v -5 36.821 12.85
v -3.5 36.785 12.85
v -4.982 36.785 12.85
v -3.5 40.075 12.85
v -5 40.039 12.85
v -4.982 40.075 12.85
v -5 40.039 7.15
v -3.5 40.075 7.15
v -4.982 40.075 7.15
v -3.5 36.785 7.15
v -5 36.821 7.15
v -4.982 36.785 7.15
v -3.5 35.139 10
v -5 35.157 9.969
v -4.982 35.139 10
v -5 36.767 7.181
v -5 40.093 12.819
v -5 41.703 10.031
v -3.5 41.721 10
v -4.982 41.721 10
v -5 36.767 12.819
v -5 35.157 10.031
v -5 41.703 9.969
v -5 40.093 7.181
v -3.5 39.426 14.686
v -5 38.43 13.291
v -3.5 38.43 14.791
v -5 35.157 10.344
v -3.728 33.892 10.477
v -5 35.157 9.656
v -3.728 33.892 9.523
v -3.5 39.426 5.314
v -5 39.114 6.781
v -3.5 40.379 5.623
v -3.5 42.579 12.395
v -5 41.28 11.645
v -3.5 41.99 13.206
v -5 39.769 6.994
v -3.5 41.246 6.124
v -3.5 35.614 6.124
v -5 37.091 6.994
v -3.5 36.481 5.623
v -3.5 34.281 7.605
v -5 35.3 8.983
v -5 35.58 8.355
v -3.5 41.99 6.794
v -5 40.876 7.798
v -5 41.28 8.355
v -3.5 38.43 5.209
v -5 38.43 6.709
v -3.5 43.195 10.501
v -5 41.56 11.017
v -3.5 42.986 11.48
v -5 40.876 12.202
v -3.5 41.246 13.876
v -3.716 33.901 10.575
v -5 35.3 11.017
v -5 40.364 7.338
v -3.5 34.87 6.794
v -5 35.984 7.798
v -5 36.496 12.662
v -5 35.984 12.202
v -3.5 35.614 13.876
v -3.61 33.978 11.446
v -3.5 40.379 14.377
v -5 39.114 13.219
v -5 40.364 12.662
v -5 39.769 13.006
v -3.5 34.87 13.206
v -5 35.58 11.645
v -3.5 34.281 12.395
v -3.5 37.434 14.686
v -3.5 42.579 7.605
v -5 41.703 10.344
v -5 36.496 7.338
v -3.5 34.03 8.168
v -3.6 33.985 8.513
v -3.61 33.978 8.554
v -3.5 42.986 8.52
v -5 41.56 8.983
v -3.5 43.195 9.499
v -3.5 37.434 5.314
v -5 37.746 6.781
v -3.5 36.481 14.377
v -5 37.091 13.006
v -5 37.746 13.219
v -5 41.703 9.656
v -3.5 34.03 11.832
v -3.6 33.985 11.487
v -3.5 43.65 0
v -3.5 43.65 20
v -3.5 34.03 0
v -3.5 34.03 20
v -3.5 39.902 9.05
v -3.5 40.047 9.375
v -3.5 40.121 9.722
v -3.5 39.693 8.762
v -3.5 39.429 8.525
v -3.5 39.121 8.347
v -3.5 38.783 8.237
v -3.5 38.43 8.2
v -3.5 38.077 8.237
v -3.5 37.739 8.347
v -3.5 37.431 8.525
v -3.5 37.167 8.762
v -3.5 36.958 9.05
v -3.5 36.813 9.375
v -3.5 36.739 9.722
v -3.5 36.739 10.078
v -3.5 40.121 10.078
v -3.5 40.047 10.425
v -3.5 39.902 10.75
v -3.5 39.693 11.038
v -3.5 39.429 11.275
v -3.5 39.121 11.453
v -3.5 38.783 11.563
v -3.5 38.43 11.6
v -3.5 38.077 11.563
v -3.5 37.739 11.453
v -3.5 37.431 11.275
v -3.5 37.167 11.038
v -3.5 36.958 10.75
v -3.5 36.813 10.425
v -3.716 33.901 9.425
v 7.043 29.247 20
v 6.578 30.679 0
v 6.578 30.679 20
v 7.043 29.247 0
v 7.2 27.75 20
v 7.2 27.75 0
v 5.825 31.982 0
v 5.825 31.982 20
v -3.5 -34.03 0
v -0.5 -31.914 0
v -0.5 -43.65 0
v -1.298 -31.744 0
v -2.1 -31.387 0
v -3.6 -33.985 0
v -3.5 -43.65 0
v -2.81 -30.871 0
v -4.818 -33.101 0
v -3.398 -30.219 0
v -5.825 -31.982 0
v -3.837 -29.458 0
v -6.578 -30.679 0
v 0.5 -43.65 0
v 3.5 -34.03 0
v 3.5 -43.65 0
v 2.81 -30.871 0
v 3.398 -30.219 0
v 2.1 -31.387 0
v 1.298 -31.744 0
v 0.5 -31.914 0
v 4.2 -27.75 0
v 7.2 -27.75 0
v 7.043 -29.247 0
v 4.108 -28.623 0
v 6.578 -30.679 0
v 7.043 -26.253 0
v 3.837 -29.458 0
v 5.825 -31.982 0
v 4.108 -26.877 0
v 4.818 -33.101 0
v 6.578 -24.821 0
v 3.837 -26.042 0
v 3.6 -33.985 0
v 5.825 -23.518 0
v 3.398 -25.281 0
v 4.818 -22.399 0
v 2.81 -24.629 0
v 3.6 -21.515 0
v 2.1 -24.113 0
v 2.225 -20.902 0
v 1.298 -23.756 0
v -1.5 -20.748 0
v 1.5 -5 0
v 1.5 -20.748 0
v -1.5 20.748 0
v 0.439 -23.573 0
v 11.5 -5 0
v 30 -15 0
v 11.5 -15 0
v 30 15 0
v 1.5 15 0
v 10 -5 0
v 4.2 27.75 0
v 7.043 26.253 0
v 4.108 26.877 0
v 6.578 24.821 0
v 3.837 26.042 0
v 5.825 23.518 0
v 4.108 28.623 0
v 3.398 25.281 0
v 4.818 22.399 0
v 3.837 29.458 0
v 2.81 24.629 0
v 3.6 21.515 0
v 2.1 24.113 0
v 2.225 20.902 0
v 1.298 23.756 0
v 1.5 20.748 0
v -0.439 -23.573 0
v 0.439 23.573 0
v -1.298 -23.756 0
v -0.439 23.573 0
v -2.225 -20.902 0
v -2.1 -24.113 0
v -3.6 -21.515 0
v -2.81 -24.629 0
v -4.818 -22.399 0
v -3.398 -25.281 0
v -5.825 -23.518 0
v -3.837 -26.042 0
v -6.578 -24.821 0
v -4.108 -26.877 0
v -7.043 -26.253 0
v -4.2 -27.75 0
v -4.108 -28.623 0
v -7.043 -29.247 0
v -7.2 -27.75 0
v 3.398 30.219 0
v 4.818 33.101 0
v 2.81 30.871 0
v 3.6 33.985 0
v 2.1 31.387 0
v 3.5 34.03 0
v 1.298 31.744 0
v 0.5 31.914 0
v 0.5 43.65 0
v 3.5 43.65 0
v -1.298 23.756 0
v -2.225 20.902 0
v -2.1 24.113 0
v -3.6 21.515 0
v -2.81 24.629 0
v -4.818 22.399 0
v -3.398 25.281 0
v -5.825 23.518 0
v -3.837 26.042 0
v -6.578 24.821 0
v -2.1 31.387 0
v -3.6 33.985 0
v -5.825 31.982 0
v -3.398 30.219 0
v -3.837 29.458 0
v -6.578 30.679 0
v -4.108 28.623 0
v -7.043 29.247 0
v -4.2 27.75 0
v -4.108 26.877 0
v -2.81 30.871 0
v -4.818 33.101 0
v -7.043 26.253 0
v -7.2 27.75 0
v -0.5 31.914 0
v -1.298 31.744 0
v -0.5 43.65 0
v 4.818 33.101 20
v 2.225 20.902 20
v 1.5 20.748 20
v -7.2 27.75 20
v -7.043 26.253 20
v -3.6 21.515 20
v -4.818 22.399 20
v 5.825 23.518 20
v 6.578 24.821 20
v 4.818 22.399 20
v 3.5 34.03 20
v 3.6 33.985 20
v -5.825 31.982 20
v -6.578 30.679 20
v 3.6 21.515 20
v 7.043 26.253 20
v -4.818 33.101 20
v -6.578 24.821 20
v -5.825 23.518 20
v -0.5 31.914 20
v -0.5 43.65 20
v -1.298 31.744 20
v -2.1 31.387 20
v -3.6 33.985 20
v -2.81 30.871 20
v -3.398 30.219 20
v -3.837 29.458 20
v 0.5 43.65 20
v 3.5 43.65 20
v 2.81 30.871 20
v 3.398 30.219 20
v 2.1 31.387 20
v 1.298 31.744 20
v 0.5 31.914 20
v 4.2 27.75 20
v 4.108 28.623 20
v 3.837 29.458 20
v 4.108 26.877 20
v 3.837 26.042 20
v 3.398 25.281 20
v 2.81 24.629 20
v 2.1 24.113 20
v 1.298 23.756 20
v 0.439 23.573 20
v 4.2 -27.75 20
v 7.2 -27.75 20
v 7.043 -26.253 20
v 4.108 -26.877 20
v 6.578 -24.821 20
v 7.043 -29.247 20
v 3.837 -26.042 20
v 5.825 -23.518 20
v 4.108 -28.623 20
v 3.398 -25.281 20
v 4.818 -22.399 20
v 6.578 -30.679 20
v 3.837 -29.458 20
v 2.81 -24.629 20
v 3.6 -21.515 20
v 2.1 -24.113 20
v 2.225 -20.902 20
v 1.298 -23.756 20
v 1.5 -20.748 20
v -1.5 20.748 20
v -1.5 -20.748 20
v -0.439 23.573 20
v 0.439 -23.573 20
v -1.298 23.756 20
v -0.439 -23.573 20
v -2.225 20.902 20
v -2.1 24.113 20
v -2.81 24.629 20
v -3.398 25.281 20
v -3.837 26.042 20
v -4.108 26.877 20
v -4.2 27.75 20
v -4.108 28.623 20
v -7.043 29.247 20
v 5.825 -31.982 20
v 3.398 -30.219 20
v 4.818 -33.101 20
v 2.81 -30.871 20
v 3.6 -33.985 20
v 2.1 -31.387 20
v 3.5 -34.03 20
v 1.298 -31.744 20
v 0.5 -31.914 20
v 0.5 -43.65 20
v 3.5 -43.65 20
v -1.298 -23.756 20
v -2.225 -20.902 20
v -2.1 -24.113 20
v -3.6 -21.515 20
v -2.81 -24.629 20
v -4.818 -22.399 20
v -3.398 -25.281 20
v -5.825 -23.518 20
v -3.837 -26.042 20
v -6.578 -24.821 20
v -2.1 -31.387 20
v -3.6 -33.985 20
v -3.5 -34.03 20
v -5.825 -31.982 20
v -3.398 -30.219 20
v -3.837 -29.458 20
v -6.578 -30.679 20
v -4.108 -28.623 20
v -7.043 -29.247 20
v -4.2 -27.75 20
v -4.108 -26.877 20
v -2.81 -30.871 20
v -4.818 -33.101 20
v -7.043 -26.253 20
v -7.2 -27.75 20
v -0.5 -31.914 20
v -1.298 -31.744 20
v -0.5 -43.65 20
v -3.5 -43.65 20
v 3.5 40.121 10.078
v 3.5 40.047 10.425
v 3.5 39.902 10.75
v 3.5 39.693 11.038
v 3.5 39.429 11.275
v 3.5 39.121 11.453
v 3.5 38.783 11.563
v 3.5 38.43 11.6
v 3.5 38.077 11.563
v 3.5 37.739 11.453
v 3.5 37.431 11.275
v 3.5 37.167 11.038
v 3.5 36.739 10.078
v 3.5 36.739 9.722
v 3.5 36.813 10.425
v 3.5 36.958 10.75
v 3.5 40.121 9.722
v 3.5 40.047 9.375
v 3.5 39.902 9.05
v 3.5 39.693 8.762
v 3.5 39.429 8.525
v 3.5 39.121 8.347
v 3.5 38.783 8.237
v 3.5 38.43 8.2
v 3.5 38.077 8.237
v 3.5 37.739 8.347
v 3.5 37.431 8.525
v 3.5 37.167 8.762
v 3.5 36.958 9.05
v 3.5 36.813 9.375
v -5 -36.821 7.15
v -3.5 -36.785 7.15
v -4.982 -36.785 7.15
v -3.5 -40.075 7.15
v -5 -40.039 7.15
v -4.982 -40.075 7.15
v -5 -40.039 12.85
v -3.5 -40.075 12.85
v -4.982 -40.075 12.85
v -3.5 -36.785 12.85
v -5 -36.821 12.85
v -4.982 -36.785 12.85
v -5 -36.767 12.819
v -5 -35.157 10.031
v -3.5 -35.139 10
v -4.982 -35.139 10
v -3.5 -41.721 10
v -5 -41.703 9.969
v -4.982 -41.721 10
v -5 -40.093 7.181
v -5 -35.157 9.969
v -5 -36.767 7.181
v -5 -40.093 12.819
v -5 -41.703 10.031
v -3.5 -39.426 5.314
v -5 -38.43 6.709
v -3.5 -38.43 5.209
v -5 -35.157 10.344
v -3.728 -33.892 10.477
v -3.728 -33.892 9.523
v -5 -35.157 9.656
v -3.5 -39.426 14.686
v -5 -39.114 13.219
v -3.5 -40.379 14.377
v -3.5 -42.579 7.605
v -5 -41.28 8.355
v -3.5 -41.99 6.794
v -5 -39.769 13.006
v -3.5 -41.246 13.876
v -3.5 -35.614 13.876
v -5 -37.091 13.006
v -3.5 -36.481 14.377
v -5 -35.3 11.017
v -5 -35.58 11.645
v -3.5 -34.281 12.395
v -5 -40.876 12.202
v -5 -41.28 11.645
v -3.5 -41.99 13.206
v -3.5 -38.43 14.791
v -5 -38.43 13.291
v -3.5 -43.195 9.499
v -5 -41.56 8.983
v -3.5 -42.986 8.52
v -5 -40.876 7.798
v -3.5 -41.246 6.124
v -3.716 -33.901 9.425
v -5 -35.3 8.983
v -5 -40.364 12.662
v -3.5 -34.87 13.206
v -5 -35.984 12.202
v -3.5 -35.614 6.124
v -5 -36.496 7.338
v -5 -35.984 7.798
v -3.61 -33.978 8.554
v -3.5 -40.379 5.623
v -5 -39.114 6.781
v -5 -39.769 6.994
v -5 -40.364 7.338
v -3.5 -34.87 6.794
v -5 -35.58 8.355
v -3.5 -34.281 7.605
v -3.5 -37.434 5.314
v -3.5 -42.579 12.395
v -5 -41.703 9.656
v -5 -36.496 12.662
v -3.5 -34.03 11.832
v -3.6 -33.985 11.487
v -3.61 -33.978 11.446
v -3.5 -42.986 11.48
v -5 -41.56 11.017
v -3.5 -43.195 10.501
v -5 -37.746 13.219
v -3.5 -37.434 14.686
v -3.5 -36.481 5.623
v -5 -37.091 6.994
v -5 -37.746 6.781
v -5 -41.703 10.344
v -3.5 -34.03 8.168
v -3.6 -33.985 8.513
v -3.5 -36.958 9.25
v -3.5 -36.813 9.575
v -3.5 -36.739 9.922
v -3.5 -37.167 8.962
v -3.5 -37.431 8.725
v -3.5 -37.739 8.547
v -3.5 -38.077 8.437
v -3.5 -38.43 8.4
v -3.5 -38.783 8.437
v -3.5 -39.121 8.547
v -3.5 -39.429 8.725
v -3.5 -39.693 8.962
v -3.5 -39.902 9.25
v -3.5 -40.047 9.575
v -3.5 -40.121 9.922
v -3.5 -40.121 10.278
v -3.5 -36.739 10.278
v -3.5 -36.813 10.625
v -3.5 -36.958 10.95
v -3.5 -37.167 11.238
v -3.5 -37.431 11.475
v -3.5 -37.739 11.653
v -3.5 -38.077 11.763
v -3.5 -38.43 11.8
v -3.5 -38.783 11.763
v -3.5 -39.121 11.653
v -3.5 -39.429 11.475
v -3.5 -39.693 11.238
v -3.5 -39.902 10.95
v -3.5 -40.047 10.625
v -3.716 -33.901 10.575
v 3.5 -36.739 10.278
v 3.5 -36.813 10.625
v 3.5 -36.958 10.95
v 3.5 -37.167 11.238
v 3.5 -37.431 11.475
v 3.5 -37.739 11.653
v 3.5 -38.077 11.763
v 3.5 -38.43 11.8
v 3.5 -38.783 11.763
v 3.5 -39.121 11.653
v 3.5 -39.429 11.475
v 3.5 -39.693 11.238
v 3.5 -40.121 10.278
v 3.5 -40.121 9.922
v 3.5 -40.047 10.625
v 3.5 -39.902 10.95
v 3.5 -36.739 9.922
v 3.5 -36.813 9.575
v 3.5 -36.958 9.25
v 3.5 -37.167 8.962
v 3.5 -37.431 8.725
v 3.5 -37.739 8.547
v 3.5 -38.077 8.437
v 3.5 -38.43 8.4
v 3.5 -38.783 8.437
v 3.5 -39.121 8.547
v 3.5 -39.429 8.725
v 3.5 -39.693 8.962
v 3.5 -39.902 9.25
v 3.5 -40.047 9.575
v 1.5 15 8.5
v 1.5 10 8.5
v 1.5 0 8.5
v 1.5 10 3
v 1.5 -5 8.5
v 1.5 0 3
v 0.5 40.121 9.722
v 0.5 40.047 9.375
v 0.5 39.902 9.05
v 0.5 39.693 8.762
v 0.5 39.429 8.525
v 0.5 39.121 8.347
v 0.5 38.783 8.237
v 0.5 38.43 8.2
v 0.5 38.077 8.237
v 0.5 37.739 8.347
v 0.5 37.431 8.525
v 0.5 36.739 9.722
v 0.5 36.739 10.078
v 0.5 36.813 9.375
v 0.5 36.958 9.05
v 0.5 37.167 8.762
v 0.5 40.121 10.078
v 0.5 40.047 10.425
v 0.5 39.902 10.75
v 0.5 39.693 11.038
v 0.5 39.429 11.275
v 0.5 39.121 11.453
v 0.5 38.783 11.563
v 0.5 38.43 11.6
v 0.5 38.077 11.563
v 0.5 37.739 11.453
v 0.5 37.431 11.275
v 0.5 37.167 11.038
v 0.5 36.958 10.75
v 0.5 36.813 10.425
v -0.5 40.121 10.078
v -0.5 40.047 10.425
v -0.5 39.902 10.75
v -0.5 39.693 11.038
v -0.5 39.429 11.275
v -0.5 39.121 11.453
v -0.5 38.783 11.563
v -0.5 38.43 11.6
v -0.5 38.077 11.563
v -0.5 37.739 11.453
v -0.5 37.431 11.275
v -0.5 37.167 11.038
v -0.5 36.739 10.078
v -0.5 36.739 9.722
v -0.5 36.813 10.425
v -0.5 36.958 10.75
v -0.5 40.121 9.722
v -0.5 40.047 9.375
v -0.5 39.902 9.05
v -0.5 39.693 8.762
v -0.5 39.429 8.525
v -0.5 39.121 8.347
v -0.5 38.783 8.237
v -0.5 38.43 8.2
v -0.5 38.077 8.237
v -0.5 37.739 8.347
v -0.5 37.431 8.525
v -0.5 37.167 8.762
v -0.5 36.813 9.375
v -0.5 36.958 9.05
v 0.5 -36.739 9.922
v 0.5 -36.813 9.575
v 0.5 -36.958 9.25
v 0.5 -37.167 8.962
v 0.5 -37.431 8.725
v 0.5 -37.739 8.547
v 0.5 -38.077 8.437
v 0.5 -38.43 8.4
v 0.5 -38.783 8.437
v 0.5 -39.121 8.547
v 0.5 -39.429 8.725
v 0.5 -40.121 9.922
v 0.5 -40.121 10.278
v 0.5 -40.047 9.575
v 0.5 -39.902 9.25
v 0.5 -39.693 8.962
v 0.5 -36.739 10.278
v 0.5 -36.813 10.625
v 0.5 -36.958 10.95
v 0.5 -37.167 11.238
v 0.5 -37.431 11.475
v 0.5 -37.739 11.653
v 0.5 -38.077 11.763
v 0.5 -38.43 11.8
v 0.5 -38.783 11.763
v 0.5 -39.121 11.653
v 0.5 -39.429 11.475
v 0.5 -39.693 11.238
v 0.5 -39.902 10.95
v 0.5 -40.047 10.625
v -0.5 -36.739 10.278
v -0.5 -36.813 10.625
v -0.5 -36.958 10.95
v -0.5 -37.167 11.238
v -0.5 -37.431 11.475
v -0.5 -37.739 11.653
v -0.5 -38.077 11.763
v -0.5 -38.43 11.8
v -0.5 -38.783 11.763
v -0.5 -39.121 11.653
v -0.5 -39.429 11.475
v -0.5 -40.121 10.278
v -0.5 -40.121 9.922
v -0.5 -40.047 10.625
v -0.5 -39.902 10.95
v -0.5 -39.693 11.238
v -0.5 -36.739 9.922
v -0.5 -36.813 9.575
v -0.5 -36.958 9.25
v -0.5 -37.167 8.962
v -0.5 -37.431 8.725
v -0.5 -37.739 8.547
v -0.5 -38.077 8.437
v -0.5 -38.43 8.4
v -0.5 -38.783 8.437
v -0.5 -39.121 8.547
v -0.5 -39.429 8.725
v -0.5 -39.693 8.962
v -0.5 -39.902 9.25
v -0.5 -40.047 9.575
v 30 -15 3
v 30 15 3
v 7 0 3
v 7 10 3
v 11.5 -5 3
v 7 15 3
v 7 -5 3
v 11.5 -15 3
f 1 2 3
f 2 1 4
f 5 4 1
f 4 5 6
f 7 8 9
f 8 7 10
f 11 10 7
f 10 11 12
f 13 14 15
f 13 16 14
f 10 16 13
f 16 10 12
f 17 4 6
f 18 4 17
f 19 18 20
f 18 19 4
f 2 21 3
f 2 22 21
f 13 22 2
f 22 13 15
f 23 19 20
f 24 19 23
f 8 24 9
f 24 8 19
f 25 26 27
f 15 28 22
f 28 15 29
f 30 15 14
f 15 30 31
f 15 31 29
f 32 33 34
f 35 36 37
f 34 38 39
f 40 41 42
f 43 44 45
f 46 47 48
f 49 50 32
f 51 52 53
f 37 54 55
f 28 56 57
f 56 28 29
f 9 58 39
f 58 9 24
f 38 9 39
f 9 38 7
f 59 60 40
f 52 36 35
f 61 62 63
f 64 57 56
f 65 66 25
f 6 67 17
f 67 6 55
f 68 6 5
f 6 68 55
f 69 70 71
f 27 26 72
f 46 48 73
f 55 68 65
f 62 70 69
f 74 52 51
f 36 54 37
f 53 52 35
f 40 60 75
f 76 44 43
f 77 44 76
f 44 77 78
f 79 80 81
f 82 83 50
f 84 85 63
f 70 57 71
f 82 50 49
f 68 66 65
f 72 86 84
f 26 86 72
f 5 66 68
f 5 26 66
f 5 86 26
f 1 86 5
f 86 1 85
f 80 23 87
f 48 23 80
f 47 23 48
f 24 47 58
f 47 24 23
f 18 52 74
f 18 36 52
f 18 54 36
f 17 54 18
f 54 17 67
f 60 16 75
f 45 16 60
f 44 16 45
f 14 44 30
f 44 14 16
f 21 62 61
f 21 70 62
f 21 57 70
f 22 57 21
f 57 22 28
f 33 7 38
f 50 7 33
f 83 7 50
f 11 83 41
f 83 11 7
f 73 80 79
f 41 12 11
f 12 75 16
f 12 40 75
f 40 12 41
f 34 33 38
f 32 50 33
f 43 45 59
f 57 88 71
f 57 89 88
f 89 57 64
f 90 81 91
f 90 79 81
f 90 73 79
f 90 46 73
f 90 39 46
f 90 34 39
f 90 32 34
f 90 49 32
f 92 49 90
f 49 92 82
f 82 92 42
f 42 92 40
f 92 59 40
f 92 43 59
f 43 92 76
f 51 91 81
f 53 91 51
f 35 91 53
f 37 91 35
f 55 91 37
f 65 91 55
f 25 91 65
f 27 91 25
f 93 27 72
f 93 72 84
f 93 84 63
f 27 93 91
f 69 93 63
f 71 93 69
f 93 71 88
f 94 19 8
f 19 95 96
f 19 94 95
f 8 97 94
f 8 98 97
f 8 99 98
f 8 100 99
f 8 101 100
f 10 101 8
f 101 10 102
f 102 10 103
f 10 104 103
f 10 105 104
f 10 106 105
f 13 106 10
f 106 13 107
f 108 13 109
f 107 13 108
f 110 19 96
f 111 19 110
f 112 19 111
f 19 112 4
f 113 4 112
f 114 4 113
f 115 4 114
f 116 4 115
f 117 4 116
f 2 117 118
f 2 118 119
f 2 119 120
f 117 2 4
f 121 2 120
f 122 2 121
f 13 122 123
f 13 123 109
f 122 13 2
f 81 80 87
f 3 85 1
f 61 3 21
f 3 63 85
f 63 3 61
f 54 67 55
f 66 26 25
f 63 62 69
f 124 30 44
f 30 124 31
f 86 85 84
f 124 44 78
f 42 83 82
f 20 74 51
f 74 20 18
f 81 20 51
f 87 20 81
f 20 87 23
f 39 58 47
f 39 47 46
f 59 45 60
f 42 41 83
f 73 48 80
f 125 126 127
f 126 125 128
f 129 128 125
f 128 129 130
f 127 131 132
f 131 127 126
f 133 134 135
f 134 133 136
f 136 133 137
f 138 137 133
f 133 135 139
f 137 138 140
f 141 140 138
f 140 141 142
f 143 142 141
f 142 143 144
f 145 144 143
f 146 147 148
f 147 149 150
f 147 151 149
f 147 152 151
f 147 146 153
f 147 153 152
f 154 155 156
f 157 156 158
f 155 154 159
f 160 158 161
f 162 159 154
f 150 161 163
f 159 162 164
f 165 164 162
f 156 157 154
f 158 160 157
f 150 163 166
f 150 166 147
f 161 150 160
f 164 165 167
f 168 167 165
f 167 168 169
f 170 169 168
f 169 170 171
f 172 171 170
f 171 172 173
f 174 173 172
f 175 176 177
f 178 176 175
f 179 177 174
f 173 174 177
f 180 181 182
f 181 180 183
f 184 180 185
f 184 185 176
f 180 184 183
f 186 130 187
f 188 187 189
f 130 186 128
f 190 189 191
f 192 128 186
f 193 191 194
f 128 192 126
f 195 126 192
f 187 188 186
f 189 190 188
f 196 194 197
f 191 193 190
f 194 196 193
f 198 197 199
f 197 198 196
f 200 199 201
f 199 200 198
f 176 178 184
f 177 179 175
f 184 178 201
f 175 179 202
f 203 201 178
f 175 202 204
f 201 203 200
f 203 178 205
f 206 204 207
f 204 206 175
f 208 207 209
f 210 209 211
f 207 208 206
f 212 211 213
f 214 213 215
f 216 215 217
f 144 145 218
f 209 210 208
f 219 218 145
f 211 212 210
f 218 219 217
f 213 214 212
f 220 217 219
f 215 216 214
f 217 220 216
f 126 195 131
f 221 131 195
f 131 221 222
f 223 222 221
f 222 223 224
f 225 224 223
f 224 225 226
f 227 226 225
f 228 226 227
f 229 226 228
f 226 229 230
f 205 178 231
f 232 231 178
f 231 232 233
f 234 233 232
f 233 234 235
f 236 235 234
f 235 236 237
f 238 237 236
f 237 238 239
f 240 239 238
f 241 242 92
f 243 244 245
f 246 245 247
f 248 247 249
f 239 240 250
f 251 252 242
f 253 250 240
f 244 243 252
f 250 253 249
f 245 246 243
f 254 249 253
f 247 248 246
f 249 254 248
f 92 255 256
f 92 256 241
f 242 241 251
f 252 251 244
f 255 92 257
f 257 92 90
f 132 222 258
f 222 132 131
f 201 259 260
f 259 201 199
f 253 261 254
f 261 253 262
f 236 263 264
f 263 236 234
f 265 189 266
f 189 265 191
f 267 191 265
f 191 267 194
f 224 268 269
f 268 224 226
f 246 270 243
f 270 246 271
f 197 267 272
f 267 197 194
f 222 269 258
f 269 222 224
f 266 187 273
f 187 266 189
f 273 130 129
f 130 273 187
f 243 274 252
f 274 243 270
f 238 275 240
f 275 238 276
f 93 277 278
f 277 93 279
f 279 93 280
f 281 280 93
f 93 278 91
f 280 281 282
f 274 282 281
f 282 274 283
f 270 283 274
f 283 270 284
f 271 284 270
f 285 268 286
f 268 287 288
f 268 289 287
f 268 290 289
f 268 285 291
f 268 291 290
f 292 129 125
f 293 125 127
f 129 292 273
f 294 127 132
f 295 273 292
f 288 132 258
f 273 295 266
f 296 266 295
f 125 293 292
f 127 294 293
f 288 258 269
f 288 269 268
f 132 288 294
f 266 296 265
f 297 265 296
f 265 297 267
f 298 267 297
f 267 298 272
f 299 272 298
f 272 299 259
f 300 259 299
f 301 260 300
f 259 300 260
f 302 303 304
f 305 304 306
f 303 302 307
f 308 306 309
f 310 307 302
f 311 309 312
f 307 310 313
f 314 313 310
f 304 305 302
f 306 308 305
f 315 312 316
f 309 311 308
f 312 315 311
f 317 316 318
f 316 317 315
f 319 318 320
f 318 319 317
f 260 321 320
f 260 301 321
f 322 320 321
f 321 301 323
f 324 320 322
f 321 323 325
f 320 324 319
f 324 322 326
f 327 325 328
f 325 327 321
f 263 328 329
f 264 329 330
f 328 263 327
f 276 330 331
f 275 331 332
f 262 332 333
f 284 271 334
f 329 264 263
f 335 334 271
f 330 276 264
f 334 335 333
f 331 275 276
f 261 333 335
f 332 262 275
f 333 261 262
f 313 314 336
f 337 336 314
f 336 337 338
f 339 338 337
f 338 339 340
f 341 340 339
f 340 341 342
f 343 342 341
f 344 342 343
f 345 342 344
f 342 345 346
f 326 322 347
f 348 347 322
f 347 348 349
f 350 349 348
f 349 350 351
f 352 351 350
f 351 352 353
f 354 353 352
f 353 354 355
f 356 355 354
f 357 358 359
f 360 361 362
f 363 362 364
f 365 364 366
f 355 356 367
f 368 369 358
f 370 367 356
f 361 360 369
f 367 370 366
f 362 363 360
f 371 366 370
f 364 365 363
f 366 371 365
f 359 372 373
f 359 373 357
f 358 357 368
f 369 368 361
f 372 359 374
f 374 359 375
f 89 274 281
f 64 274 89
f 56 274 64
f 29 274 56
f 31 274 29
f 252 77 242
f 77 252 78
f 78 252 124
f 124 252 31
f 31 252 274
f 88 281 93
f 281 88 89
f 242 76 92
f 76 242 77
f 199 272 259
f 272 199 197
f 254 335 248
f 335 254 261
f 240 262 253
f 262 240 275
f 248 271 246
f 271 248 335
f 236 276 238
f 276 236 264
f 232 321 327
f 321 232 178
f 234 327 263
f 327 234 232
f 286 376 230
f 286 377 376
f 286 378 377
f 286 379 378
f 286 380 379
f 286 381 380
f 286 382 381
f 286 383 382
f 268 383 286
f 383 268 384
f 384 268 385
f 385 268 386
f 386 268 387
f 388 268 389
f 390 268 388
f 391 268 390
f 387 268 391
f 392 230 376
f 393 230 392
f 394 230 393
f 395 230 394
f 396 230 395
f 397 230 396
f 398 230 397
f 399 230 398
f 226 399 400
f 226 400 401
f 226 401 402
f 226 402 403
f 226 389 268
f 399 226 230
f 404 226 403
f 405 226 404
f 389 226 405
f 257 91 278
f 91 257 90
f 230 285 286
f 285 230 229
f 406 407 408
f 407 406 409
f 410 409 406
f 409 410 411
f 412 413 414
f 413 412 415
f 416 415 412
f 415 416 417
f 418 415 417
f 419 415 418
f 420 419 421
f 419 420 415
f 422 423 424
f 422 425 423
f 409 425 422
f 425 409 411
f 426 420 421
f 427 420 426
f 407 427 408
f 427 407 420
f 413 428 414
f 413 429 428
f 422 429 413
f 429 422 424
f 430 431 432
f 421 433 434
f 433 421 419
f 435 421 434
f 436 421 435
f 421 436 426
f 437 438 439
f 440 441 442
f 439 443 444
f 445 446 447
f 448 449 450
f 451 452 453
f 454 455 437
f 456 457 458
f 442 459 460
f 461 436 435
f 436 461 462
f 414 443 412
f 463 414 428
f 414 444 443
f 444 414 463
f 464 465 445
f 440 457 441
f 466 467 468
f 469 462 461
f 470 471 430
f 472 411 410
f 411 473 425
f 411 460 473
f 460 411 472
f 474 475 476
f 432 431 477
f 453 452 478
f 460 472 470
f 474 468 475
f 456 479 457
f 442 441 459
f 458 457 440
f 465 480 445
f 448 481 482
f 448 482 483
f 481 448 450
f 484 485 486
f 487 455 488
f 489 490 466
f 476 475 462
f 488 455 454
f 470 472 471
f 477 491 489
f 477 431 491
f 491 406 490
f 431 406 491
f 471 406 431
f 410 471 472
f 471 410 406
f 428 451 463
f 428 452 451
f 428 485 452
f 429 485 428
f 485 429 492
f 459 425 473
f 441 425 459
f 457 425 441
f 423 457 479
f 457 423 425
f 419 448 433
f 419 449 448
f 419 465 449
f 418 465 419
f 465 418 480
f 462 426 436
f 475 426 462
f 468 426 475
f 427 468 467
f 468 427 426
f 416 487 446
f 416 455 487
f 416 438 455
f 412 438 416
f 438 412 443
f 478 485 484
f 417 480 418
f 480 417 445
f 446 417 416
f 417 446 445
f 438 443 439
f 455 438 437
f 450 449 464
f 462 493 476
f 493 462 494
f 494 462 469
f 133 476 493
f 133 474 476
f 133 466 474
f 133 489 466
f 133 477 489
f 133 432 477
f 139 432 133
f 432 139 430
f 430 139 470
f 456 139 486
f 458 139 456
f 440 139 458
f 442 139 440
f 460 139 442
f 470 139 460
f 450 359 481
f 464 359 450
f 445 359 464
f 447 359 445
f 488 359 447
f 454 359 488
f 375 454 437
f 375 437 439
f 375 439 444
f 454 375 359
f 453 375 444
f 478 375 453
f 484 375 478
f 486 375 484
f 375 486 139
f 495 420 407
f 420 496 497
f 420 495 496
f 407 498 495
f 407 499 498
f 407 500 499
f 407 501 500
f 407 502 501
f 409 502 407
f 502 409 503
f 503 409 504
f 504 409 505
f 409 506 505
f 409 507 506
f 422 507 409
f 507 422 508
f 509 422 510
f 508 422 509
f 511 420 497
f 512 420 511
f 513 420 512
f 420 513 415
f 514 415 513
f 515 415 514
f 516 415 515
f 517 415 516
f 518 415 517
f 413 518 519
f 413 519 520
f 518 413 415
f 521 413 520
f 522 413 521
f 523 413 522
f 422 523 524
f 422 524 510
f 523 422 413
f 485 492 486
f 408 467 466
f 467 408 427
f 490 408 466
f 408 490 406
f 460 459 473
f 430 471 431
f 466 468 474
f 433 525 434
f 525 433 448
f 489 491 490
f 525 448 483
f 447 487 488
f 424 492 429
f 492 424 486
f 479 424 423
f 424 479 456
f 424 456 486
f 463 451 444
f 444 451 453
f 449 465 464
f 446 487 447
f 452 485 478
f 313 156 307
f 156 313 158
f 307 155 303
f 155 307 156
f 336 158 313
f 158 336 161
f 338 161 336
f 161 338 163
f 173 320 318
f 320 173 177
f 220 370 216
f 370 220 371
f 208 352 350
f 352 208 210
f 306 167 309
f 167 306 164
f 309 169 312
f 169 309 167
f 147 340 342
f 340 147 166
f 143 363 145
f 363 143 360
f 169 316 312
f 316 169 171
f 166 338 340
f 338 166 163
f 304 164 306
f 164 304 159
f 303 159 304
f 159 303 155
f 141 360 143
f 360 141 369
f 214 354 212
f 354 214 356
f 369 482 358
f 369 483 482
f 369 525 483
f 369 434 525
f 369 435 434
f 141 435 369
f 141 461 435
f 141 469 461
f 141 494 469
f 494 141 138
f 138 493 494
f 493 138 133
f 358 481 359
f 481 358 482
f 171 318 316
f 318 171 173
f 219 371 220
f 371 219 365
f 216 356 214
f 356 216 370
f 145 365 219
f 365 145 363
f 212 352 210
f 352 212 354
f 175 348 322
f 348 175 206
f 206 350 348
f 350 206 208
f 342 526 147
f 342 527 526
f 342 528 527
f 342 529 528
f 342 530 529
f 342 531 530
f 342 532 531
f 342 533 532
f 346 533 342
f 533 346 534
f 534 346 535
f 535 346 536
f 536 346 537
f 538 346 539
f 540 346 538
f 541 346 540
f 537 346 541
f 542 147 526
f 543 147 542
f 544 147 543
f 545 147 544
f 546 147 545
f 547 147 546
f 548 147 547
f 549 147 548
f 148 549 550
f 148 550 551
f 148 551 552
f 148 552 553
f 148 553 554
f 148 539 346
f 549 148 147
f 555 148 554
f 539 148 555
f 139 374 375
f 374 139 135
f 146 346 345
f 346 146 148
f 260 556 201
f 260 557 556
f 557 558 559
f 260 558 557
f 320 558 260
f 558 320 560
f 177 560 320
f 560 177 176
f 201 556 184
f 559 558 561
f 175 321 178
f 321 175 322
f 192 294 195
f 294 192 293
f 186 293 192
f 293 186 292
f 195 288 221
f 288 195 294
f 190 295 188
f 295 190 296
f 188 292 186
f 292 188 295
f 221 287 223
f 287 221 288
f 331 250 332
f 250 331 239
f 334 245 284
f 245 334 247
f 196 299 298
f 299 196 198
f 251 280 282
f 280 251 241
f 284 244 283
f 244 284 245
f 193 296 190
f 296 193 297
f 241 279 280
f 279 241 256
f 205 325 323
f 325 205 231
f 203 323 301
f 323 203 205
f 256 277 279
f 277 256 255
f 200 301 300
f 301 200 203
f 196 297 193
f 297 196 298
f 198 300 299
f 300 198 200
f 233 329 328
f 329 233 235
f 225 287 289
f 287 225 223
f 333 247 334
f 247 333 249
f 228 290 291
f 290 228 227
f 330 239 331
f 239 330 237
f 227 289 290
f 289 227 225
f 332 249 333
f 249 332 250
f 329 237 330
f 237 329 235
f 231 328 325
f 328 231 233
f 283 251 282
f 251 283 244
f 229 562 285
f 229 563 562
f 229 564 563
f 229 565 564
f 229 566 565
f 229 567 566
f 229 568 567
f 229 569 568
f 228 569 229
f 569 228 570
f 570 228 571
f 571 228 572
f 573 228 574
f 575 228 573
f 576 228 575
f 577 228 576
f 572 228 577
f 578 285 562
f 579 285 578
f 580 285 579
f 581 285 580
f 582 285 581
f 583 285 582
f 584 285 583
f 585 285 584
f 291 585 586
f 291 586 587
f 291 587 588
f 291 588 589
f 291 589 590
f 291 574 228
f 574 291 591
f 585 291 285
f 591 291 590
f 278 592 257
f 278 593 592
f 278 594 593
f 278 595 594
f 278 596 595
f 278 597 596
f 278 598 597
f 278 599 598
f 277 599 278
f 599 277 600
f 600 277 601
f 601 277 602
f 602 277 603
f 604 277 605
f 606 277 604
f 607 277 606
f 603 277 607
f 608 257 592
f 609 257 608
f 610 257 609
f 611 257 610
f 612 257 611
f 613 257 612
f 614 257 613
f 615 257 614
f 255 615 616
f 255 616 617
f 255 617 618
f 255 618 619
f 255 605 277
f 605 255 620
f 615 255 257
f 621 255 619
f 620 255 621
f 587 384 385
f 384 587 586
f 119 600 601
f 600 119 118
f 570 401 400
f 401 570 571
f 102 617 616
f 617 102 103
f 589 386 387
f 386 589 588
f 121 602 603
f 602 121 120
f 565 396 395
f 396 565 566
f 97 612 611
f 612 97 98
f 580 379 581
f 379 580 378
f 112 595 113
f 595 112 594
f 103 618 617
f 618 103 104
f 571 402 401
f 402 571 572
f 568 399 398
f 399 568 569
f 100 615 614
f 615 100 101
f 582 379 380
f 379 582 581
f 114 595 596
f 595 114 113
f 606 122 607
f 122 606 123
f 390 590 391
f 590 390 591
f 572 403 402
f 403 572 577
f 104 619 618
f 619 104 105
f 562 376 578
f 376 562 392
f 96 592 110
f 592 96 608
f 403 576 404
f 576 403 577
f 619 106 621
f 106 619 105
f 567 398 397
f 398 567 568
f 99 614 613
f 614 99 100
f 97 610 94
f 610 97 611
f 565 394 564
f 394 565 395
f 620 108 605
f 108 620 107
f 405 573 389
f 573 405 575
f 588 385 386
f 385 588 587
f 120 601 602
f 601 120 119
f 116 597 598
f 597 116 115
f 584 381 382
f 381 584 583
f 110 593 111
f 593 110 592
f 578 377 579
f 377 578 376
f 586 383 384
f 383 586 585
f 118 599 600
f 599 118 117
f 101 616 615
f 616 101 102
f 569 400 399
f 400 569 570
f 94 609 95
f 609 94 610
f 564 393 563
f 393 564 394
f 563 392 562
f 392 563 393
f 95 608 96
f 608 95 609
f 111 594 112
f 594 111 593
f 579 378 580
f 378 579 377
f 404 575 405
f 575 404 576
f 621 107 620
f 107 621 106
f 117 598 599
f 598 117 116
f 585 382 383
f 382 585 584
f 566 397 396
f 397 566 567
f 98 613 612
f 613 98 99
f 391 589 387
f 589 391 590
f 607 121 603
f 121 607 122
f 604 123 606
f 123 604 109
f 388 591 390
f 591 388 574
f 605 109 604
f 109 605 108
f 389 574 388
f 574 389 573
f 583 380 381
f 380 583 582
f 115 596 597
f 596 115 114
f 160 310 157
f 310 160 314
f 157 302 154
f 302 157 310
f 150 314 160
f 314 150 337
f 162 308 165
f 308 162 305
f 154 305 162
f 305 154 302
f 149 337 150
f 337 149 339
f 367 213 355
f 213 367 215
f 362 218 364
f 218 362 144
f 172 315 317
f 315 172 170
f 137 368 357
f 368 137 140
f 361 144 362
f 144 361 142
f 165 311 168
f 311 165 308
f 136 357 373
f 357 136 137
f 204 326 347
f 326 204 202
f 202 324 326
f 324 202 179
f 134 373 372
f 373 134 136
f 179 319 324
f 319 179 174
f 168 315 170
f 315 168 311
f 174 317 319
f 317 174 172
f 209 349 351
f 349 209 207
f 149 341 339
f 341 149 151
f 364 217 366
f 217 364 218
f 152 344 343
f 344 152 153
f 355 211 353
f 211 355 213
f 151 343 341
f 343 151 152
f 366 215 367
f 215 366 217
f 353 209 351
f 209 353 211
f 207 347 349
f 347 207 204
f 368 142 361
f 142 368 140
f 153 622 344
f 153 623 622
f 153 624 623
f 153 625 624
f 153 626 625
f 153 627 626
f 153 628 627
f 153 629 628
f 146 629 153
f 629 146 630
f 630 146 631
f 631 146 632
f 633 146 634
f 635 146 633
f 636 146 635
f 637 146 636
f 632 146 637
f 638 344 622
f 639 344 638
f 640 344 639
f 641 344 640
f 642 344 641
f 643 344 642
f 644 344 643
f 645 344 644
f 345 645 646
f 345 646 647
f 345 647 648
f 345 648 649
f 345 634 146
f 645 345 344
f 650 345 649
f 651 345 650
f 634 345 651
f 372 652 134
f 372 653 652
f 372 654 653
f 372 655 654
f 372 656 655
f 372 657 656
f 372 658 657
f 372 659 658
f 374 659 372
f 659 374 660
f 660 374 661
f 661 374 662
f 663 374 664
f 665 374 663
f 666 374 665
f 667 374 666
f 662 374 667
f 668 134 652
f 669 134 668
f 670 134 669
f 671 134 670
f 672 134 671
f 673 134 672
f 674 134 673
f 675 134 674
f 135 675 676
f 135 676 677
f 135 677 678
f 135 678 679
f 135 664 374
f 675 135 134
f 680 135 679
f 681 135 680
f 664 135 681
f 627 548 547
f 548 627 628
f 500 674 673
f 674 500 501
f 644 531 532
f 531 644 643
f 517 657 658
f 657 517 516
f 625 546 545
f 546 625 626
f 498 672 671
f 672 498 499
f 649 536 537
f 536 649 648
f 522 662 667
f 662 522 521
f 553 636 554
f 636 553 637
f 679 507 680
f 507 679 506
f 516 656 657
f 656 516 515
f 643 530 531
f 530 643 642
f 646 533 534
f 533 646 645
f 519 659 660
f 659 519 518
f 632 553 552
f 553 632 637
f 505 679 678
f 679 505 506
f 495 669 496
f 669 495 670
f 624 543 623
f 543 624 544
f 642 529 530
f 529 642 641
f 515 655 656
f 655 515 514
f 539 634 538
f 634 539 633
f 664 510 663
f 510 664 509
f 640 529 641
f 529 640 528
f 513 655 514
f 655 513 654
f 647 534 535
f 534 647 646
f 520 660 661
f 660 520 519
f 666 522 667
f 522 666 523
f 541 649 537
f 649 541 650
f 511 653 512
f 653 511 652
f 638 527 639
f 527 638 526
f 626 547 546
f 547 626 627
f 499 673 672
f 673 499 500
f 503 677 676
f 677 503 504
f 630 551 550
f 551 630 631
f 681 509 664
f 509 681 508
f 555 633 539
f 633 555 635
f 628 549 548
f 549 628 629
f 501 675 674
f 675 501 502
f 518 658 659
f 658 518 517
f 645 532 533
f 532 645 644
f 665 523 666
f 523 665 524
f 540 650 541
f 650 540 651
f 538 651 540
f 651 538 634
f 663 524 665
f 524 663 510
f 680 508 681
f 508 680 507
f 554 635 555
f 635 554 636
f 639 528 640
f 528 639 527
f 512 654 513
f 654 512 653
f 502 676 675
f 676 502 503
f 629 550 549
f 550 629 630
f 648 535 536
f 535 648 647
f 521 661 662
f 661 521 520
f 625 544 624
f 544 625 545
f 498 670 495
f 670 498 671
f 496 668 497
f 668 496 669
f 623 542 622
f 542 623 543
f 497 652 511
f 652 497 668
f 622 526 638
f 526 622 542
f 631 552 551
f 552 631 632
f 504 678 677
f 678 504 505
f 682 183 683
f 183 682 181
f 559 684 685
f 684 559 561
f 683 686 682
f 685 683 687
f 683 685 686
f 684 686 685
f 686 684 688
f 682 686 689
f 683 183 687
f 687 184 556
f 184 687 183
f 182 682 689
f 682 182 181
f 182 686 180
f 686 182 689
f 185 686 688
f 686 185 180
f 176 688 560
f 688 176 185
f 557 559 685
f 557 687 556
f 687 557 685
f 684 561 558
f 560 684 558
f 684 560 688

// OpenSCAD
fn = 100;

module triangle(o_len, a_len, depth)
{
    linear_extrude(height=depth)
    {
        polygon(points=[[0,0],[a_len,0],[0,o_len]], paths=[[0,1,2]]);
    }
}

//
//  Mounting brackets for Quanum 680 and other platforms
//  that use twin tubes as equipment mounts
// 
//  by Egil Kvaleberg
//


// platform mounting tube diameter
mount_tube_dia = 8.4;  // leave some space to make fitting easier

// platform mounting tube distance
mount_tube_dist = 55.5;  // center to center (applies to dual)


// tune these:
// example: "dual" / 48 / 65 / 12 / 3
//          "single" / 40 / x / 12 / 3
//          "servo" / x / x / 12 / 3

// type of mounts
mount_type = "dual"; // [ dual, single, servo ]
// offset from center line, use 0 for flat bar
mount_offset = 0.0;
// exit angle from mount 		
mount_angle = 65;
// width of clamp		
mount_width = 20;  
// wall thickness		
mount_wall = 3;		   

//servo_flange_width = 28;
//servo_screw = 2.0;
//servo_flange_height = 16; // height to bottom of mount flange

// for servo mount: flange width
servo_flange_width = 35.0;
// for servo mount: screw diameter
servo_screw = 2.5;
// for servo mount: height to bottom of mount flange
servo_flange_height = 20.0; 

// gap of flange
mount_gap = 1.0;
// mount screw diameter
screw = 3.0; // M3 is 3.0 and M2.5 is 2.5	 
// nut, across flats
nut = 5.5;    // M3 is 5.5
// nut height
nut_h = 1.5;    // M3
mount_screw = screw + 0.2;
nut_w = nut + 0.2; 
mount_flange = nut_w+2*nut_h;  // depth of flange

j = 1*0.1;
$fs = 1*0.1;

module nut_cage() {	
	difference ( ) {
		cylinder(r1 = (nut_w/2)/cos(30) + nut_h, r2 = (nut_w/2)/cos(30), h = nut_h);
		translate([0, 0, nut_h/2]) union () {
			cube([nut_w, tan(30)*nut_w, nut_h+j], center=true);
			rotate ([0, 0, 60]) cube([nut_w, tan(30)*nut_w, nut_h+j], center=true);
			rotate ([0, 0, 120])cube([nut_w, tan(30)*nut_w, nut_h+j], center=true);
		}
	}
}

module Mount_Flange_add()
{
	union () {
		cylinder(r = mount_tube_dia/2 + mount_wall, h = mount_width);
		translate([-(2*mount_wall+mount_gap)/2, 0, 0]) cube([2*mount_wall+mount_gap, mount_tube_dia/2+mount_wall+mount_flange, mount_width]);
		translate([-(mount_wall+mount_gap/2), mount_tube_dia/2 + mount_wall + mount_flange*.4, mount_width/2]) rotate([0, -90, 0]) nut_cage(); // screw hole
	}
}

module Mount_Flange_sub()
{
	translate([0, 0, -j]) union () {
		cylinder(r = mount_tube_dia/2, h = mount_width+2*j);
		translate([-mount_gap/2, 0, 0]) cube([mount_gap, mount_tube_dia/2+mount_width, mount_width+2*j]);
		translate([-(2*mount_wall+mount_gap+2*j)/2, mount_tube_dia/2 + mount_wall + mount_flange*.4, mount_width/2]) rotate([0, 90, 0]) cylinder(r = mount_screw/2 + 0.1, h = 2*mount_wall+mount_gap+2*j); // screw hole
	}
}

module Mount_Beam(gap, length)
{		
	translate([-mount_wall/2, gap, 0]) cube([mount_wall, length, mount_width]);
}

module Mount_Dual(offset, angle)
{
	leg = offset/cos(90-angle)-mount_tube_dia/2;
	color([0, 200/255, 0, 0.5])
	difference () {
		union () {
			translate([0, mount_tube_dist/2, 0]) Mount_Flange_add();
			translate([0, -mount_tube_dist/2, 0]) translate([0, 0, mount_width]) rotate([180, 0, 0]) Mount_Flange_add();

			if (leg > 0) {
				// left part	
				translate([0, -mount_tube_dist/2, 0]) rotate([0, 0, angle]) Mount_Beam(mount_tube_dia/2, leg);
				translate([-offset, offset/tan(angle)-mount_tube_dist/2, 0]) cylinder(r = mount_wall/2, h = mount_width);
				// straight part	
				translate([-offset, -mount_tube_dist/2, 0]) Mount_Beam(offset/tan(angle), mount_tube_dist - 2*offset/tan(angle));

				// right part	
				translate([0, mount_tube_dist/2, 0]) rotate([0, 0, 180-angle]) Mount_Beam(mount_tube_dia/2, leg);
				translate([-offset, -offset/tan(angle)+mount_tube_dist/2, 0]) cylinder(r = mount_wall/2, h = mount_width);
			} else {
				// straight part
				translate([0, -mount_tube_dist/2, 0]) Mount_Beam(offset/tan(angle), mount_tube_dist - 2*offset/tan(angle));
			}
		}
		union () {
			translate([0, mount_tube_dist/2, 0]) Mount_Flange_sub();
			translate([0, -mount_tube_dist/2, 0]) translate([0, 0, mount_width]) rotate([180, 0, 0]) Mount_Flange_sub();
		}
	}
}

module Mount_single(leg)
{
	color([0, 200/255, 0, 0.5])
	difference () {
		union () {
			 translate([0, 0, mount_width]) rotate([180, 0, 0]) Mount_Flange_add();

			// straight part
			Mount_Beam(mount_tube_dia/2, leg - mount_tube_dia/2);

		}
		union () {
			translate([0, 0, mount_width]) rotate([180, 0, 0]) Mount_Flange_sub();
		}
	}
}


module Mount_servo(dist)
{
	module column(dx)
	{
		translate([dx, mount_tube_dia/2, 0]) {
			difference() {
				union() {
					cube([mount_wall, mount_wall+servo_flange_height, mount_width]);
					translate([mount_wall/2, mount_wall+servo_flange_height, mount_width/2]) rotate([90, 0, 0]) cylinder(r = 1.0+servo_screw/2, h = 1.0 + servo_flange_height/2); 
				}
				// hole for servo mounting screw
				translate([mount_wall/2, mount_wall+servo_flange_height+j, mount_width/2]) rotate([90, 0, 0]) cylinder(r = servo_screw/2, h = j+servo_flange_height/2); 
			}
		}
	}

	//color([0, 200/255, 0, 0.5])
	difference () {
		union () {
			 translate([0, 0, mount_width]) rotate([180, 0, 0]) Mount_Flange_add();

			// servo
			column(-mount_tube_dia/2 - mount_wall);
			column(dist - mount_tube_dia/2 - mount_wall);
			translate([-mount_tube_dia/2 - mount_wall, mount_tube_dia/2, 0]) cube([dist+mount_wall, mount_wall, mount_width]);

		}
		union () {
			translate([0, 0, mount_width]) rotate([180, 0, 0]) Mount_Flange_sub();
		}
	}
}


module view()
{
	if (mount_type == "dual") Mount_Dual(mount_offset, mount_angle);
	else if (mount_type == "single") Mount_single(mount_offset);
	else if (mount_type == "servo") Mount_servo(mount_offset);
	else echo("Unknow mount_type");
}



union()
{
    view();
    
    translate([0,-15,0])
    {
        difference()
        {
            cube([30,30,3]);
            translate([1.5,-5,-5])
            {
                cube([10,15,30]);
            }
            
        }
    }
    union()
    {
        translate([0,15,0])
        {
              rotate([90,0,0])
                    {
                    triangle(10,10,5);
                    }
        }
        
        translate([0,0,0])
        {
              rotate([90,0,0])
                    {
                    triangle(10,10,5);
                    }
        }
    }
}
